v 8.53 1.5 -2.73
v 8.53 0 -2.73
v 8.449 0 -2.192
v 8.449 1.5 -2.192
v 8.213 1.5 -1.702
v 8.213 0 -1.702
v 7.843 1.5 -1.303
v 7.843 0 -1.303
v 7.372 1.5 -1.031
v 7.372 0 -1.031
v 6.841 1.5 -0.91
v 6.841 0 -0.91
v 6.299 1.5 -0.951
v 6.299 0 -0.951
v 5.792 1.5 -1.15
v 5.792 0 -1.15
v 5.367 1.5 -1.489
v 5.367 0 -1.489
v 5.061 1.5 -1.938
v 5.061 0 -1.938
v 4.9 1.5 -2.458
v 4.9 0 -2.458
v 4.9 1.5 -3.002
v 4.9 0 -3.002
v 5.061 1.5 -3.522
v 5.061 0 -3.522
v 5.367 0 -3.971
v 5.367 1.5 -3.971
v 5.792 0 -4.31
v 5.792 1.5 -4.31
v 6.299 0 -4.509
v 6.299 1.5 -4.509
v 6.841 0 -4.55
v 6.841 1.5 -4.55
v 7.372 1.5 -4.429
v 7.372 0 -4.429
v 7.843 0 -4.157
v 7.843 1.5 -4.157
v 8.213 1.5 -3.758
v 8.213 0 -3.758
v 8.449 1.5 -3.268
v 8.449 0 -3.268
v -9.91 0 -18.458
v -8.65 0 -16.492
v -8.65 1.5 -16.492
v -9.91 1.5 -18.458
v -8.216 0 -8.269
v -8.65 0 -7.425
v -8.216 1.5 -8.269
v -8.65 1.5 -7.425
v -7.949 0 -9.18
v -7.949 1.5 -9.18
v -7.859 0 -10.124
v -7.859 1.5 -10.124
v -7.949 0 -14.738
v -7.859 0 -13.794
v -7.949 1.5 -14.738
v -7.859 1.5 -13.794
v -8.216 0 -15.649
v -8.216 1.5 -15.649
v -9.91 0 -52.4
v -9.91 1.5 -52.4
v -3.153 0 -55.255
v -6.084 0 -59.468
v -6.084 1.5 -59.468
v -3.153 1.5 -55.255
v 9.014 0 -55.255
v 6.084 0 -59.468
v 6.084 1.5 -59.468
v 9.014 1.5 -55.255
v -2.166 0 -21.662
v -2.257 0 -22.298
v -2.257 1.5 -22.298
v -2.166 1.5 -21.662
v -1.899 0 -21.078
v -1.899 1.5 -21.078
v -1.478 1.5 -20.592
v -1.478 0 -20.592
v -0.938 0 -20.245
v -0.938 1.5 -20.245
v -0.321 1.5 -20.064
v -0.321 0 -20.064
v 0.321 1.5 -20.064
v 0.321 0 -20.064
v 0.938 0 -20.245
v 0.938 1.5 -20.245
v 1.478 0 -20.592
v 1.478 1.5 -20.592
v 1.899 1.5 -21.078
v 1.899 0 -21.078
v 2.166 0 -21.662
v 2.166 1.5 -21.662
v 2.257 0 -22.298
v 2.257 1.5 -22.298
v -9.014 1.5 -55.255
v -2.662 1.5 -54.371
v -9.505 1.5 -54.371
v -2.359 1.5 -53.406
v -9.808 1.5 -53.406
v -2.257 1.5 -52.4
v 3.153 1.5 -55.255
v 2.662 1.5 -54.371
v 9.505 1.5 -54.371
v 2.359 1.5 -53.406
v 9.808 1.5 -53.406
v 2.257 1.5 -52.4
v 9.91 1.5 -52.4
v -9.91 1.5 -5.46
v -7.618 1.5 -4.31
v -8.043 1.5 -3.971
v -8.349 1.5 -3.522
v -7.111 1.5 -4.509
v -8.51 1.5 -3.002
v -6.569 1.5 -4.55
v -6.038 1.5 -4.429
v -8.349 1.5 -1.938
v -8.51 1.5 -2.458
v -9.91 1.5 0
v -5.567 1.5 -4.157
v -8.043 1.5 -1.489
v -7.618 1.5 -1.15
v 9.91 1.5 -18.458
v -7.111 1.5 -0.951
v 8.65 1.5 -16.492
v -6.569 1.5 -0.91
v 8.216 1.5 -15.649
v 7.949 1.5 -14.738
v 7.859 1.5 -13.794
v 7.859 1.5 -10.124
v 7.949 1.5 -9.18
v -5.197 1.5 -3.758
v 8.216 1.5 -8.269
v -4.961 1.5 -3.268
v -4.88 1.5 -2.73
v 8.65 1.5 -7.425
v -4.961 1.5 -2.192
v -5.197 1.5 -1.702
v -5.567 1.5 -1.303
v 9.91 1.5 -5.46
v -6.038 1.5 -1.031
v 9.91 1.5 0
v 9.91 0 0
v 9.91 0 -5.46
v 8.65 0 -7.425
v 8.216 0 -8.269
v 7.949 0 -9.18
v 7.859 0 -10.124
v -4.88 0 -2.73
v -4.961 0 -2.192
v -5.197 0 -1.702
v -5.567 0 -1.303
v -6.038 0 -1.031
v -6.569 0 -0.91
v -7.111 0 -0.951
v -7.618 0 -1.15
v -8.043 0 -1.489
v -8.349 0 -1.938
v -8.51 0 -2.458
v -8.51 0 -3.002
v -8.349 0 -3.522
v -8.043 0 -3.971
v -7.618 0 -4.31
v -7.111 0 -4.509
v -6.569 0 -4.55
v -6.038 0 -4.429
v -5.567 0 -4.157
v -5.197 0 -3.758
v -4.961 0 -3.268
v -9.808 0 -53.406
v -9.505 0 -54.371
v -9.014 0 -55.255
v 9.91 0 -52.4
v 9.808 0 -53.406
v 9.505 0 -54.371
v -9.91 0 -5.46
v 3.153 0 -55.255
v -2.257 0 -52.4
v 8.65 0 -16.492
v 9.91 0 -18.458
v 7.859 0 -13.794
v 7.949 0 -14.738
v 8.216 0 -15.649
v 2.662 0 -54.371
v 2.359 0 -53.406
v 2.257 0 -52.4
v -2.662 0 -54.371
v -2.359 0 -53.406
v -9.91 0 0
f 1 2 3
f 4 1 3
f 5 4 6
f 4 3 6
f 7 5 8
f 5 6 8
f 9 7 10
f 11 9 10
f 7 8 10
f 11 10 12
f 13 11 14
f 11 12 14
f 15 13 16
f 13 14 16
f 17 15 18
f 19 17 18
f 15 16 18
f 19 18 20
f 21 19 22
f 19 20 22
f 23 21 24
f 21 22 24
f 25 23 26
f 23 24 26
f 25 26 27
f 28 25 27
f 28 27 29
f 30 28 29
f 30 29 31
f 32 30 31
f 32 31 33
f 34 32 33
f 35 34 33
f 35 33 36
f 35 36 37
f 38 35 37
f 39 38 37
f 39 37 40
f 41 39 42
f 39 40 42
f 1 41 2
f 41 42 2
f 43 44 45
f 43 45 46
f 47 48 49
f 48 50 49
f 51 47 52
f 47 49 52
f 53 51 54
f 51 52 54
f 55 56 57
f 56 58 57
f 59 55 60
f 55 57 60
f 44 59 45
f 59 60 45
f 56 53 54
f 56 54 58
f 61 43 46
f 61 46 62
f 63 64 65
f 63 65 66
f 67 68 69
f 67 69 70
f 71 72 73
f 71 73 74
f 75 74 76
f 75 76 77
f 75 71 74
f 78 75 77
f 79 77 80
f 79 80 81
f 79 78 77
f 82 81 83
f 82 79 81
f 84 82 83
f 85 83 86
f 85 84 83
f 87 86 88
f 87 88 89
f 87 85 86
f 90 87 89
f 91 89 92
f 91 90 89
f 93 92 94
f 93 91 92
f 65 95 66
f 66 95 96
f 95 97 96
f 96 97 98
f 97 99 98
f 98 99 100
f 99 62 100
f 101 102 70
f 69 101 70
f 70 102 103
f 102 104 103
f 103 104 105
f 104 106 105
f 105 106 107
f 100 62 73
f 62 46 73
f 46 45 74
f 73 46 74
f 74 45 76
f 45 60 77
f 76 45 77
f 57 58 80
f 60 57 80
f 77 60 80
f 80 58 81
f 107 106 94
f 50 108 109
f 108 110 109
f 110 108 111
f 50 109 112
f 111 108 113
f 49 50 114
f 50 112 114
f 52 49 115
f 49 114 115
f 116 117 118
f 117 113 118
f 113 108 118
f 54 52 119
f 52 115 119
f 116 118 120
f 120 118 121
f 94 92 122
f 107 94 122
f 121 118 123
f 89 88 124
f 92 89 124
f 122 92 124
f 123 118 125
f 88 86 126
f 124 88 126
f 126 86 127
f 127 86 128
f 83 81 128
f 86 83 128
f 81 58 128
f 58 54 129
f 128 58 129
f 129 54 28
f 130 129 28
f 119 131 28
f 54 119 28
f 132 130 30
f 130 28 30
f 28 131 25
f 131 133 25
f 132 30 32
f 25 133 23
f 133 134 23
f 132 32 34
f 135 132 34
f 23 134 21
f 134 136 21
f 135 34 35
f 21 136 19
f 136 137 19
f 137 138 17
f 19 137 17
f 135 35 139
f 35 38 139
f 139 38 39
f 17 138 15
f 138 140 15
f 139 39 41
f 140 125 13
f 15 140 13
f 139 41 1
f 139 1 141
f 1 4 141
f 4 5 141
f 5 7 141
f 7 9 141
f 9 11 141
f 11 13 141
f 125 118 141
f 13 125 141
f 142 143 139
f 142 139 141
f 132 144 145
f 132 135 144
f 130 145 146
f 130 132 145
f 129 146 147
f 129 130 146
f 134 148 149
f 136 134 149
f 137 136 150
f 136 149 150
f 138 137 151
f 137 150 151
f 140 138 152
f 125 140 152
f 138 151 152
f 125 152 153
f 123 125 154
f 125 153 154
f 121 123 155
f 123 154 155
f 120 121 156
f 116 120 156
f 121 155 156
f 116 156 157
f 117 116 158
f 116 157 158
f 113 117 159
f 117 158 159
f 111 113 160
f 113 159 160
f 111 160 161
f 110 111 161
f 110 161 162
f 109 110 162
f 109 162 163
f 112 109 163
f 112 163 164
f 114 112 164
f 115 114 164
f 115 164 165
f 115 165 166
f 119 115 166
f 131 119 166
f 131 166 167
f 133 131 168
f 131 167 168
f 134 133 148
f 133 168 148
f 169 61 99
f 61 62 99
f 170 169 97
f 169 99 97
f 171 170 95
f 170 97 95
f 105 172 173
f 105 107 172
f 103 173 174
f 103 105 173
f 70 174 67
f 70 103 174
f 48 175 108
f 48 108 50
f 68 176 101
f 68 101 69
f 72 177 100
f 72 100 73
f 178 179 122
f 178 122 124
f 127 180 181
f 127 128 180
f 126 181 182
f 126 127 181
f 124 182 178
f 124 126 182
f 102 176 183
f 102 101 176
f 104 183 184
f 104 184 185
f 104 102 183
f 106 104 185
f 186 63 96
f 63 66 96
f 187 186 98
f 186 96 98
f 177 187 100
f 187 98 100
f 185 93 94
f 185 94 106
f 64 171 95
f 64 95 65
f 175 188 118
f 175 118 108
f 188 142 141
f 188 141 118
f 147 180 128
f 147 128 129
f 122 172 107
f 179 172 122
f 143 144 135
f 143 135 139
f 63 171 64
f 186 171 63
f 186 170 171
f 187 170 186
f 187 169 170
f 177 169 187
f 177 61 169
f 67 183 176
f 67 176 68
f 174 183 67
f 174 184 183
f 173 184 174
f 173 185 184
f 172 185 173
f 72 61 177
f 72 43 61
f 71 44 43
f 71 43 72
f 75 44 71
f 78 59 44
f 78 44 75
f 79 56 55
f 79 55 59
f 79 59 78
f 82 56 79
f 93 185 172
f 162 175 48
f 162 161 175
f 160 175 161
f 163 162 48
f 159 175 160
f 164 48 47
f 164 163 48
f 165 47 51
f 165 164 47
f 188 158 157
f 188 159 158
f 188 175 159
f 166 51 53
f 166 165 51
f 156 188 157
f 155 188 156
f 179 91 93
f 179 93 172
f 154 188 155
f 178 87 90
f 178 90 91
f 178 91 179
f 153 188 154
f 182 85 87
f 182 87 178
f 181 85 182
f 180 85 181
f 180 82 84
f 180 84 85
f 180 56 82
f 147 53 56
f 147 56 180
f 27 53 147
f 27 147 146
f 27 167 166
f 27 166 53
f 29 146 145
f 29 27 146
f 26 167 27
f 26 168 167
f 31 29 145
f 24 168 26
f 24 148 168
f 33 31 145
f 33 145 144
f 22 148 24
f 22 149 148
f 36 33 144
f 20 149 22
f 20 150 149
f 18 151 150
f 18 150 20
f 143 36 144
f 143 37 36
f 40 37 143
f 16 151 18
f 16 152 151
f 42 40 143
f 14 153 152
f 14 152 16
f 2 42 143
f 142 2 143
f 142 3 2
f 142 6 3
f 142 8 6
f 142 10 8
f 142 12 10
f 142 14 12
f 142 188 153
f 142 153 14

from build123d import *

# Parameters (mm, degrees)
F0_R     = 1.825
F1_DEPTH = 1.5
F2_R     = 5


with BuildPart() as f1:
    # F0 (on Front) → F1 (new body)
    with BuildSketch(Plane.XZ):
        with BuildLine():
            Line((9.91, 0), (0, 0))
            Line((0, 0), (-9.91, 0))
            Line((-9.91, 0), (-9.91, -5.46))
            Line((-9.91, -5.46), (-7.858928, -8.658922))
            Line((-7.858928, -8.658922), (-7.858928, -15.258922))
            Line((-7.858928, -15.258922), (-9.91, -18.457845))
            Line((-9.91, -18.457845), (-9.91, -53.967845))
            Line((-9.91, -53.967845), (-6.083598, -59.467722))
            Line((-6.083598, -59.467722), (-2.257197, -53.967845))
            Line((-2.257197, -53.967845), (-2.257197, -22.297845))
            ThreePointArc((-2.257197, -22.297845), (0, -20.040648), (2.257197, -22.297845))
            Line((2.257197, -22.297845), (2.257197, -53.967845))
            Line((2.257197, -53.967845), (6.083598, -59.467722))
            Line((6.083598, -59.467722), (9.91, -53.967845))
            Line((9.91, -53.967845), (9.91, -18.457845))
            Line((9.91, -18.457845), (7.858928, -15.258922))
            Line((7.858928, -15.258922), (7.858928, -8.658922))
            Line((7.858928, -8.658922), (9.91, -5.46))
            Line((9.91, -5.46), (9.91, 0))
        make_face()
        with Locations((-6.705, -2.73)):
            Circle(F0_R, mode=Mode.SUBTRACT)
        with Locations((6.705, -2.73)):
            Circle(F0_R, mode=Mode.SUBTRACT)
    extrude(amount=-F1_DEPTH)

    # F2
    f2_edges = [f1.edges().sort_by_distance(p)[0] for p in [
        (7.858928, 0.75, -15.258922),
        (-7.858928, 0.75, -15.258922),
        (-7.858928, 0.75, -8.658922),
        (7.858928, 0.75, -8.658922),
        (9.91, 0.75, -53.967845),
        (2.257197, 0.75, -53.967845),
        (-9.91, 0.75, -53.967845),
        (-2.257197, 0.75, -53.967845),
    ]]
    fillet(f2_edges, radius=F2_R)


solid = f1.part
